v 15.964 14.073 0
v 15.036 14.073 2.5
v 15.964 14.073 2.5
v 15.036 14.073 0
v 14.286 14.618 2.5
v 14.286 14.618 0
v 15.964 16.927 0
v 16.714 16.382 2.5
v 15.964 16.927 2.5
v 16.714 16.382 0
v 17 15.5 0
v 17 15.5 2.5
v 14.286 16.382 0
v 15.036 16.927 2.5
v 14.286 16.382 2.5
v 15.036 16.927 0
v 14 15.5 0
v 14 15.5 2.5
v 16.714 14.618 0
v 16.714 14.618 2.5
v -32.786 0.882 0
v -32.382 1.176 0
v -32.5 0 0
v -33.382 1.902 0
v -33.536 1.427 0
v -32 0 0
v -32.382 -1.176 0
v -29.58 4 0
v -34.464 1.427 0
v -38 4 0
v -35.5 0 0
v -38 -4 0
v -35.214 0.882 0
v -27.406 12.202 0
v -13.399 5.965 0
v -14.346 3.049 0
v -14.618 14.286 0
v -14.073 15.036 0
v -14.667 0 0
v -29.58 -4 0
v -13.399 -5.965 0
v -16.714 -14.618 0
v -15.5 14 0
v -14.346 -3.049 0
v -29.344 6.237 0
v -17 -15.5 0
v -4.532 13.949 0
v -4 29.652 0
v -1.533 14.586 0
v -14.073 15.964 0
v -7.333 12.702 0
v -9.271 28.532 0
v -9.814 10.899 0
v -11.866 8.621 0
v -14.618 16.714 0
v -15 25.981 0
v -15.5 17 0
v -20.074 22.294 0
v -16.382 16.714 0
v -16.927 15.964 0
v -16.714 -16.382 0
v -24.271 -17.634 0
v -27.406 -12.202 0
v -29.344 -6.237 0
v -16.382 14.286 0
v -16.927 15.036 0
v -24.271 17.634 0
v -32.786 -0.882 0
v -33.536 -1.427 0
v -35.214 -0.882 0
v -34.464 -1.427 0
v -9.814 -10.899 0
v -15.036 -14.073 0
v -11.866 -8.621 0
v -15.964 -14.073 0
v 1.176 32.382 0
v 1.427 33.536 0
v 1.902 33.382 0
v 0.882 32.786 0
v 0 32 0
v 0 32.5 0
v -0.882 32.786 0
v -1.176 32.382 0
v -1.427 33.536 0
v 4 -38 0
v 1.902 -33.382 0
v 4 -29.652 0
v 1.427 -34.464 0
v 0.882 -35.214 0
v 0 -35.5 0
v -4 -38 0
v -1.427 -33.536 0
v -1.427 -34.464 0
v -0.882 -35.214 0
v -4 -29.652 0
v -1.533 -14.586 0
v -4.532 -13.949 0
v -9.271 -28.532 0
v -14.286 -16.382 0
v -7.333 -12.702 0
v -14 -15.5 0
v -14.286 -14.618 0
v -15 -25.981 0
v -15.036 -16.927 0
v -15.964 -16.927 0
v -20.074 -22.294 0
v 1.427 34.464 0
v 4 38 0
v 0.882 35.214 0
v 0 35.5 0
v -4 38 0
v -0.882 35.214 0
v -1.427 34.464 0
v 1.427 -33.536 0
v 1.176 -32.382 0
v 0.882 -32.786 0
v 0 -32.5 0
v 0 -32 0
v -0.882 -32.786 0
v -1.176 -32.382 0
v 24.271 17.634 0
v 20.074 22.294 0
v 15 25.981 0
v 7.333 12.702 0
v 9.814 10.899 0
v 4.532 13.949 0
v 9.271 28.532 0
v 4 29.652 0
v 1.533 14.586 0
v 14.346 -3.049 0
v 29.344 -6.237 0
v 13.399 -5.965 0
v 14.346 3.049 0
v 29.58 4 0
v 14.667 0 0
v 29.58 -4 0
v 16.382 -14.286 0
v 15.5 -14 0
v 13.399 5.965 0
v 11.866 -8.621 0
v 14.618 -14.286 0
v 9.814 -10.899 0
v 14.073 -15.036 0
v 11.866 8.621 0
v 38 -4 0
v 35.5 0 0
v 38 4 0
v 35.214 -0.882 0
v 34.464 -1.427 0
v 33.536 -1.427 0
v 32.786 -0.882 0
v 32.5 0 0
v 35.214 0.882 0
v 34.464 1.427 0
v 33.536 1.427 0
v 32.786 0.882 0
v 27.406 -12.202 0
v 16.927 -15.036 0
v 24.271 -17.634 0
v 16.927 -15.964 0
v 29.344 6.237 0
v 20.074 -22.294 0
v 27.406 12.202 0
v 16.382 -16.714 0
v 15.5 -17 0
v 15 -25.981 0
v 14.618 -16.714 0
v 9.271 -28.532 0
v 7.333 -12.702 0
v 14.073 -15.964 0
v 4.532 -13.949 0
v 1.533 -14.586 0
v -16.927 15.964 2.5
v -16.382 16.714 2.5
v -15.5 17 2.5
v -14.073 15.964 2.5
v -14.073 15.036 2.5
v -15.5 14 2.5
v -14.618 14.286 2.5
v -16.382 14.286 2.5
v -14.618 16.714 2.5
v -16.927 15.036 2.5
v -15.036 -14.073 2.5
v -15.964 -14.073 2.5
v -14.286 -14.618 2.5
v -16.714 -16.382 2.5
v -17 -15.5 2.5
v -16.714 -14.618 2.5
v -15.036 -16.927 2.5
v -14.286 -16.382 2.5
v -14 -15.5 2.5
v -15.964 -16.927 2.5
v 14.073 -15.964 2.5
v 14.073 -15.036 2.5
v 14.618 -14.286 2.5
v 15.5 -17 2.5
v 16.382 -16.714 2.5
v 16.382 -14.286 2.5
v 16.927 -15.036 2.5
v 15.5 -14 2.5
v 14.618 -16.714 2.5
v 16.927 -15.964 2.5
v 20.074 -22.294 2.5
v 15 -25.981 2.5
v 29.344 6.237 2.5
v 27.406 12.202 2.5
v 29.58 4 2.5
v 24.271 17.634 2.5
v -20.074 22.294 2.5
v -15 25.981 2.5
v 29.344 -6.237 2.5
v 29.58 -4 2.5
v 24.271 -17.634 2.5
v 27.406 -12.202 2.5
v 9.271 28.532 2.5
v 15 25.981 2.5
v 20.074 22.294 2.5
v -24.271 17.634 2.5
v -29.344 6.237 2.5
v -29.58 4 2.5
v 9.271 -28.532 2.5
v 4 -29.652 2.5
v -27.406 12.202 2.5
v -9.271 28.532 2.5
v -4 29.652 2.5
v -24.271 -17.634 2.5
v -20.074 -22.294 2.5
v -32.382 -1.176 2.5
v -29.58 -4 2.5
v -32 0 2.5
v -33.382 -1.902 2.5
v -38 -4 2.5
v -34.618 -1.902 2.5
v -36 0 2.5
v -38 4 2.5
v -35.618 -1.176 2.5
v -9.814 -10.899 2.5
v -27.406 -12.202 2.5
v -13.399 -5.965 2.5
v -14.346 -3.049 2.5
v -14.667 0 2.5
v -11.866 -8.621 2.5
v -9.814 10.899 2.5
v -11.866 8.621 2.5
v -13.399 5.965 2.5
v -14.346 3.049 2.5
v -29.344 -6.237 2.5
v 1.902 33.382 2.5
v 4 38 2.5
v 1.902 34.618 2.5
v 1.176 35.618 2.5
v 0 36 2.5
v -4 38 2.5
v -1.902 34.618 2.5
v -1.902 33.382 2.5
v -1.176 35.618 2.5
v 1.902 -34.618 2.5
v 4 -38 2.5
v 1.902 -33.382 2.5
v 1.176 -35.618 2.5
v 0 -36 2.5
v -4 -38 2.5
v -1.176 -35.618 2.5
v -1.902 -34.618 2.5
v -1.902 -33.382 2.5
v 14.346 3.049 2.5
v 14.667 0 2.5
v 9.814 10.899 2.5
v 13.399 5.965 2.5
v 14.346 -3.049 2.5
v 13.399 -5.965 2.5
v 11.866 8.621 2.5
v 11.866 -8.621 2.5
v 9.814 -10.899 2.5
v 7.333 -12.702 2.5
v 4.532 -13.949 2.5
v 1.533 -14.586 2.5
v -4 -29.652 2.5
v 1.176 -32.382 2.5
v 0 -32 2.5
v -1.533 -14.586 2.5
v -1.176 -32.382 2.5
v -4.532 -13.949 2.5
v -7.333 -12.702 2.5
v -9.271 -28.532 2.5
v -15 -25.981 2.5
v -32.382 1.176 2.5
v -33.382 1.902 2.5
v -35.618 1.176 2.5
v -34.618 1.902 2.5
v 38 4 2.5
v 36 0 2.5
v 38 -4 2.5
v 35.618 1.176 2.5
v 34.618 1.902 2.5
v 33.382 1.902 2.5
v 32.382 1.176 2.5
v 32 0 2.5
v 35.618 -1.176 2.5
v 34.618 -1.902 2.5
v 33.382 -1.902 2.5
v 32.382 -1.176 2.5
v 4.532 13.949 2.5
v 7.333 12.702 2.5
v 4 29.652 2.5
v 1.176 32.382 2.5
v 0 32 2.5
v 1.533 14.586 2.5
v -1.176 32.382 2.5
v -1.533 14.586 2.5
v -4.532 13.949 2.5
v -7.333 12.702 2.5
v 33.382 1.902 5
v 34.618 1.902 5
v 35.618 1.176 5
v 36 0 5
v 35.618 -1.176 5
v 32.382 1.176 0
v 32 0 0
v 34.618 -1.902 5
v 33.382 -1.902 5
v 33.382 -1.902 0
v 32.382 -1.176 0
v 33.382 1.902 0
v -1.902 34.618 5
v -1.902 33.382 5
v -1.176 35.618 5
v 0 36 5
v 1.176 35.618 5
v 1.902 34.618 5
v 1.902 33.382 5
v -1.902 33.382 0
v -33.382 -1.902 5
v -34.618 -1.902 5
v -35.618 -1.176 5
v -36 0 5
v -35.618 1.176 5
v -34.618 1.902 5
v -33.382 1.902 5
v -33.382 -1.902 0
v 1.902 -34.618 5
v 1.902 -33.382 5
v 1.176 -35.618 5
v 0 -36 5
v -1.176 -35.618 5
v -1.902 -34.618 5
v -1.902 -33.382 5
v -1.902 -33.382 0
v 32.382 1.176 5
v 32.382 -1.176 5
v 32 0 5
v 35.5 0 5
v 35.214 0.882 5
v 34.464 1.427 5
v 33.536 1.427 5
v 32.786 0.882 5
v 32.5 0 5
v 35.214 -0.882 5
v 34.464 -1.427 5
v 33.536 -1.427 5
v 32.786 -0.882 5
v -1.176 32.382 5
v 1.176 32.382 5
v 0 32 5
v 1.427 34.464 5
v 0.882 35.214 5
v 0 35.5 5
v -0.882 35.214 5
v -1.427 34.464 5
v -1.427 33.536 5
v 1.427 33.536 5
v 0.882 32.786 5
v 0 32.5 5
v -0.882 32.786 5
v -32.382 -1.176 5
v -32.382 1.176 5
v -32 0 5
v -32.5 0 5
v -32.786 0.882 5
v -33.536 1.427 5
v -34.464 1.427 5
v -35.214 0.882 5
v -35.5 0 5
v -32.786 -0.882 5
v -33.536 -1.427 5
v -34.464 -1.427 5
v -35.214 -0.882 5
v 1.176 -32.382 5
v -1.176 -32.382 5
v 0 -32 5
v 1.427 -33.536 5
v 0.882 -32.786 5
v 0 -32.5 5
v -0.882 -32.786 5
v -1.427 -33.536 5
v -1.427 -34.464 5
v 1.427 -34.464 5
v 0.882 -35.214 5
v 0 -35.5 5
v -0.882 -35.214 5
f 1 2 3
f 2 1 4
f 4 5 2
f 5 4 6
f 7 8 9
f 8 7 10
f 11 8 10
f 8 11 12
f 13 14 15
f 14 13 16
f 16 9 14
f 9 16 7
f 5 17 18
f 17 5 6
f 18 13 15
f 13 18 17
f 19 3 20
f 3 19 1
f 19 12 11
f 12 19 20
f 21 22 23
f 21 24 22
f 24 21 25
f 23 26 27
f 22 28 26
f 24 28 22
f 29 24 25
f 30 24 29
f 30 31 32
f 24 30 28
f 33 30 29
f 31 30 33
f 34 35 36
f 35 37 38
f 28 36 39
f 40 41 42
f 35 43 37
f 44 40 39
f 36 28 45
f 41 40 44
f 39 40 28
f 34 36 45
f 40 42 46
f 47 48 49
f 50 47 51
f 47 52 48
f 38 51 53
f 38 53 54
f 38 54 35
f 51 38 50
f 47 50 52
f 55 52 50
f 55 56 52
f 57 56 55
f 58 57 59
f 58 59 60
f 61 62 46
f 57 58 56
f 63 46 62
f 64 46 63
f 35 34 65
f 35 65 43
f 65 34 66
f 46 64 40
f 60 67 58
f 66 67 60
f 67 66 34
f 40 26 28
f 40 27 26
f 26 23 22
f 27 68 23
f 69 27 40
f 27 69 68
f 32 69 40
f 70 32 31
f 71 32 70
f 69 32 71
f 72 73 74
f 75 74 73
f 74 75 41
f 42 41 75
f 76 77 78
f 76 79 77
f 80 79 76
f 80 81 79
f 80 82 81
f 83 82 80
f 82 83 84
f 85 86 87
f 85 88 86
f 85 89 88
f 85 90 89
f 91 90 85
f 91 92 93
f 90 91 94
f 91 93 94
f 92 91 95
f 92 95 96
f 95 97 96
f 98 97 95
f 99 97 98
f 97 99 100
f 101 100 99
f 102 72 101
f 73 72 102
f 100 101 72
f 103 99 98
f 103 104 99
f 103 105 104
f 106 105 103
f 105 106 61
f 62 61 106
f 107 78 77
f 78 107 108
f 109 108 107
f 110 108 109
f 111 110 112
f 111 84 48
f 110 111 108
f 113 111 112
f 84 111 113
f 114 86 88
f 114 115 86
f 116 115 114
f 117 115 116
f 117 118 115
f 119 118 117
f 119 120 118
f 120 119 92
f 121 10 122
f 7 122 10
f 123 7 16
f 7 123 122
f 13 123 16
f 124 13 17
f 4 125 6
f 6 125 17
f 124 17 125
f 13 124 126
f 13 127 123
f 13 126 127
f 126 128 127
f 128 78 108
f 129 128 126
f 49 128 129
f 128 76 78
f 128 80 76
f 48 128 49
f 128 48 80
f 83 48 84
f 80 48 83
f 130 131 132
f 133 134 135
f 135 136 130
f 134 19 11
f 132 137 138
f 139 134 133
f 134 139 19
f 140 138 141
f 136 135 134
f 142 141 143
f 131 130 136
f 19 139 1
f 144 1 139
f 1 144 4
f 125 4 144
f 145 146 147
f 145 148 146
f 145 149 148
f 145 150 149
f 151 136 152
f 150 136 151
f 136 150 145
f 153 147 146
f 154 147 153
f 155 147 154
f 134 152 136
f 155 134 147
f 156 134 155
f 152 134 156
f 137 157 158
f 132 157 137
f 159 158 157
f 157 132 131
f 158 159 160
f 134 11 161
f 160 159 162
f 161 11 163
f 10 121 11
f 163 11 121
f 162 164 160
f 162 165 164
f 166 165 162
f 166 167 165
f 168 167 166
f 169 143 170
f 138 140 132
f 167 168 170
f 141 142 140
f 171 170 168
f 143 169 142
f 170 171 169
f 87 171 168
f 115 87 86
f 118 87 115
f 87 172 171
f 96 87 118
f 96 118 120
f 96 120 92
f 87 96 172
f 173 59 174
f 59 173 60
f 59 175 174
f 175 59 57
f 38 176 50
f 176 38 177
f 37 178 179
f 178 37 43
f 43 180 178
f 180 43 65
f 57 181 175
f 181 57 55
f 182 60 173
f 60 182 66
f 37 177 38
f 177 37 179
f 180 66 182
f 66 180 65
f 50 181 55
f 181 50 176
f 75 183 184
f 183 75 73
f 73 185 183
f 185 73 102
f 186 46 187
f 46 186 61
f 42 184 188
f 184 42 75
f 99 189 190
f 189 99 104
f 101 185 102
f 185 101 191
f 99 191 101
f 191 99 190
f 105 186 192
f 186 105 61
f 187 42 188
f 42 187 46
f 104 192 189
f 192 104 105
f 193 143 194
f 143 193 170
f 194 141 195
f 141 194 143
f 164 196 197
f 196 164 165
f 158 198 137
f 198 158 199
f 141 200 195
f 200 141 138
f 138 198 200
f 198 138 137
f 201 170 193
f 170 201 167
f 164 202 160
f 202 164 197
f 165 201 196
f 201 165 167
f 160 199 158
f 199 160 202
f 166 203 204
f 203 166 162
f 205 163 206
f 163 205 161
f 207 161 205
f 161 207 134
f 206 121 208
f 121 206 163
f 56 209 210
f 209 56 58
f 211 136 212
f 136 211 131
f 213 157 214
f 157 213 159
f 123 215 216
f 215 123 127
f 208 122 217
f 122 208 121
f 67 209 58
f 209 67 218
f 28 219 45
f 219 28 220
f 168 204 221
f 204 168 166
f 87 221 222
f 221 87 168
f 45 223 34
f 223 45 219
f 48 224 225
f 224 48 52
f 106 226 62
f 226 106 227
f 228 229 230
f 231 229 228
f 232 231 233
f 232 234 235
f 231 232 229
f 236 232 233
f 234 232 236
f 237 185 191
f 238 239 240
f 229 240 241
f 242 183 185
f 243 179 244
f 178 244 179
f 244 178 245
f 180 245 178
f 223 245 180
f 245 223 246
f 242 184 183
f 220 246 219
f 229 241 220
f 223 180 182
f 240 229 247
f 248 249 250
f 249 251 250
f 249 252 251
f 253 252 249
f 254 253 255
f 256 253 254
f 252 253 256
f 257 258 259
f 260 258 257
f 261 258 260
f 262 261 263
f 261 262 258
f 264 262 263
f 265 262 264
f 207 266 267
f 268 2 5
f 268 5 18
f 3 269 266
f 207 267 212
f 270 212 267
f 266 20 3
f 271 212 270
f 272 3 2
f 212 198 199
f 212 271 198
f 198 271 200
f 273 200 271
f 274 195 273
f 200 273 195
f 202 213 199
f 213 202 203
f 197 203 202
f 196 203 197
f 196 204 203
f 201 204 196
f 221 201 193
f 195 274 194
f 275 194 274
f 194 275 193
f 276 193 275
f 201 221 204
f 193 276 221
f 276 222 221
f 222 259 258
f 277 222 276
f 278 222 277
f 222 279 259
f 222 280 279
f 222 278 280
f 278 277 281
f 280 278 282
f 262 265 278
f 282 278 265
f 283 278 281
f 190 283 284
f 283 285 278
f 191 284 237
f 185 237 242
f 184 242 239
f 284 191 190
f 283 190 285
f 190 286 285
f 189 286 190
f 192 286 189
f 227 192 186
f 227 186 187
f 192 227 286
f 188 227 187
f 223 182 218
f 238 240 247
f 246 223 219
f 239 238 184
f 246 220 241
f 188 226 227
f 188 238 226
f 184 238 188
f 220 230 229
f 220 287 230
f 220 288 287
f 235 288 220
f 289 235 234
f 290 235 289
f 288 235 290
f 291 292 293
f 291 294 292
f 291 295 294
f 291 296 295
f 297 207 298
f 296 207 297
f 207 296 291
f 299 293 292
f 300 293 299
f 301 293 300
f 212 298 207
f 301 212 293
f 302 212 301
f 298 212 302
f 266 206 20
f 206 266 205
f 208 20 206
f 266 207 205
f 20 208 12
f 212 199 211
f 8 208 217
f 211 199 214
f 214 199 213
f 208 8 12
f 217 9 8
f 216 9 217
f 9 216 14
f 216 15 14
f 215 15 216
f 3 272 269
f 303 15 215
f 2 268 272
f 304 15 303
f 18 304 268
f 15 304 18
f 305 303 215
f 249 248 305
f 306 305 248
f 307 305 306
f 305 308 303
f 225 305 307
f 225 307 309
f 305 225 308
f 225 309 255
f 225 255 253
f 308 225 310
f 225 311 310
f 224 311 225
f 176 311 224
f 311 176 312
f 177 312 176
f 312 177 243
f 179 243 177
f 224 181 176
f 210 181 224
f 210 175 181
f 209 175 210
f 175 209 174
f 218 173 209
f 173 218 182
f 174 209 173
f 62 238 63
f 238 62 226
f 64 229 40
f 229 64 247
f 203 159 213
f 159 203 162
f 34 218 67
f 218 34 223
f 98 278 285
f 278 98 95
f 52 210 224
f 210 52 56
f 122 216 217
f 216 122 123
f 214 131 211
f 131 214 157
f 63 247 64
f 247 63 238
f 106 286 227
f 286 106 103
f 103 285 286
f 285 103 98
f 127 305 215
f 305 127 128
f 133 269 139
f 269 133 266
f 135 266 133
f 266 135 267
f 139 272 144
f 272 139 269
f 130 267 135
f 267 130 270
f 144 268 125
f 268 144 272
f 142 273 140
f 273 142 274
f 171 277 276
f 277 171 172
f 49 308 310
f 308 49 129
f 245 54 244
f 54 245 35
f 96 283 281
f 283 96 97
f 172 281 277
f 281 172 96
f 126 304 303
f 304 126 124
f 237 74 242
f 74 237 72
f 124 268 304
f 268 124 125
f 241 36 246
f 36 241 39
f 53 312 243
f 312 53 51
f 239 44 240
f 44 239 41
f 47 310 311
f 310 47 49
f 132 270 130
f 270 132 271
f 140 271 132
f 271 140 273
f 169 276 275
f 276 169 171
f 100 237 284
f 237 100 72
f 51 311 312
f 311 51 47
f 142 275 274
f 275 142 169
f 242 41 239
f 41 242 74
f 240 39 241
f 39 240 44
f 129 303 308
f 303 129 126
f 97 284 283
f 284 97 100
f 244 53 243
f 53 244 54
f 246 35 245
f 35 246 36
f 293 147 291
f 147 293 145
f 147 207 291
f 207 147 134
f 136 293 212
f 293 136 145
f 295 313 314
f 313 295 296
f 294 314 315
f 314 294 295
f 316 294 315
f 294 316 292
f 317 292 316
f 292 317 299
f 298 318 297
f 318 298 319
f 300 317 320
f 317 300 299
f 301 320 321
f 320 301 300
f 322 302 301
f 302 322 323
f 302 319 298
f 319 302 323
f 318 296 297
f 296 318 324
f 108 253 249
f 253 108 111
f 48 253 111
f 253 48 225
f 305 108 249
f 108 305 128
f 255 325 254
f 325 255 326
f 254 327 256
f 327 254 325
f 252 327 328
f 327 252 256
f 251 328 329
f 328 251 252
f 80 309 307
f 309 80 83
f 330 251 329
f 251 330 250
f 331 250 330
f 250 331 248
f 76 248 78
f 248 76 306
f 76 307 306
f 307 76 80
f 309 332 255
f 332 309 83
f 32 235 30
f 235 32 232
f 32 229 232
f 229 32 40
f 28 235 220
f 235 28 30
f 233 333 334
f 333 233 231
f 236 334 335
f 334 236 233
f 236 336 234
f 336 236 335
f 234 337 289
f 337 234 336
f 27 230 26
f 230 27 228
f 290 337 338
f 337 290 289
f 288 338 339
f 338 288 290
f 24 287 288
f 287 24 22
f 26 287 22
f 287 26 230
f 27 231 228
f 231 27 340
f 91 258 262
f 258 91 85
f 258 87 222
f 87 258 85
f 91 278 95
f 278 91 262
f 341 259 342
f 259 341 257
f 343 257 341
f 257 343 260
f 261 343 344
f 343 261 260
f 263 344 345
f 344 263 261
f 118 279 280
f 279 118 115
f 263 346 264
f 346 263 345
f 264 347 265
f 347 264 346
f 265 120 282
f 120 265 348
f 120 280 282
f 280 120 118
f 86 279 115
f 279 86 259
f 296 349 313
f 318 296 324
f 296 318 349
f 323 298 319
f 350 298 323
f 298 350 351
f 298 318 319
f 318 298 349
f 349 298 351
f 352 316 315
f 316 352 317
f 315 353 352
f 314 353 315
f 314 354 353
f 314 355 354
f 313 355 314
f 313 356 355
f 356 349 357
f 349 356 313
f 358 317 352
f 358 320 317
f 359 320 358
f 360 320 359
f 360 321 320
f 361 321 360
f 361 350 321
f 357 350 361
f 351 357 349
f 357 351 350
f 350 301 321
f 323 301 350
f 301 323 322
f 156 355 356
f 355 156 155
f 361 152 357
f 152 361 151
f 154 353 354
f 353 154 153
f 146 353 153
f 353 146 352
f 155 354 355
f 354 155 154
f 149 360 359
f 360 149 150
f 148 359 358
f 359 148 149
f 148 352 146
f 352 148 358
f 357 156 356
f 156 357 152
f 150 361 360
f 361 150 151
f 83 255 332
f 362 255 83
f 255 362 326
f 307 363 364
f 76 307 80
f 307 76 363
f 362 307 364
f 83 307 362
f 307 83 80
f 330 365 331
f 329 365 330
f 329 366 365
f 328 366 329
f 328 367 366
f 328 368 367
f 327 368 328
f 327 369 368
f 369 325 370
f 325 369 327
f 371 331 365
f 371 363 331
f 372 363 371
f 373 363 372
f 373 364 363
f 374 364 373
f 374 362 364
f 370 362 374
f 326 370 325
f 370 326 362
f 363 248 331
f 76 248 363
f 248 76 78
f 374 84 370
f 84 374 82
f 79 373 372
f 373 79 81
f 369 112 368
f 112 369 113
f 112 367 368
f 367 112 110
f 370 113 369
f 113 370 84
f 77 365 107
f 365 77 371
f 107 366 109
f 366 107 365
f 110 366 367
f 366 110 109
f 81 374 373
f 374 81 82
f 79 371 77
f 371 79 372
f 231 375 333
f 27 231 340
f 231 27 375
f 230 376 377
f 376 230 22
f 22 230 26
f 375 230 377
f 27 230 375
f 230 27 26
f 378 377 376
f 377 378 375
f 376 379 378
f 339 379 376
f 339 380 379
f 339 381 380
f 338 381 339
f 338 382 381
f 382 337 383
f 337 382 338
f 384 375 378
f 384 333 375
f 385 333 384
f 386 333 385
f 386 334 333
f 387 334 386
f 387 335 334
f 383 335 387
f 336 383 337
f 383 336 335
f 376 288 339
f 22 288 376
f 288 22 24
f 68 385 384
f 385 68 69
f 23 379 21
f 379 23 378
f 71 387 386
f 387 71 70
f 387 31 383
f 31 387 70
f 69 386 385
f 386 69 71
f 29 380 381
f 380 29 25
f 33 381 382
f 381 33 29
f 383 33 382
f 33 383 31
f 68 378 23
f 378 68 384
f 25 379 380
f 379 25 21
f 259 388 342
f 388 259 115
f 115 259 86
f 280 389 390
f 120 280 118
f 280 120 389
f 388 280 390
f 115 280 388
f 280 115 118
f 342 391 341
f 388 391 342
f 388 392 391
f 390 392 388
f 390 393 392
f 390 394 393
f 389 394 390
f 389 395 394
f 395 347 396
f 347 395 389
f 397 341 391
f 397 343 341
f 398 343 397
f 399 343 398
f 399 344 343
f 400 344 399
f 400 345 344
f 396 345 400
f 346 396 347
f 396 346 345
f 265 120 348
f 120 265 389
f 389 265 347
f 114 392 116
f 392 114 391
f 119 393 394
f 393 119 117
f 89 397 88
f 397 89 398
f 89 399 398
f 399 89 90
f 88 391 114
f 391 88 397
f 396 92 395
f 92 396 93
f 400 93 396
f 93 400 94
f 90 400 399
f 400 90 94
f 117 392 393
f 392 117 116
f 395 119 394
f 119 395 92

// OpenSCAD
// Diameter of the pump. Minimum of 60mm.
diam = 60;
// The spacing between the mounting holes on the stepper motor. Measure from the center of the holes.
bolt_spacing = 31;
// The space between the mounting plate and the pump gears.
mount_spacing = 2.5;
// How thick the mounting plate should be.
plate_thickness = 2.5;
// Mount inner diameter. The hole that will be in the center of the mounting plate.
mount_id = 22;
// The size of the mounting holes. Standard Nema 17 is an M3 (3mm).
thread_size = 3;

// -------------------- Connector settings ---------------------------------
// The thread size for the connector bolts you want, in mm (i.e. M3 is 3.0)
connect_bolt_size = 3.0;

// The lenght of the connector bolts, in mm (i.e M3x10 is 10.0)
connect_bolt_height = 10.0;

// Number of connectors you want.
num_connectors = 4;



// Calculated variables
connector_od = connect_bolt_size + 1;


// ============================ Main ====================================
mounting_plate();



// ++++++++++++++++++++++++++++ Modules +++++++++++++++++++++++++++++++++
// Mounting plate to attach to motor. Includes the spacer between the pump and mount.
module mounting_plate(){
	union(){
		difference(){
			cylinder(h=plate_thickness, r=diam/2);
			cylinder(h=plate_thickness + 1, r=(mount_id/3)*2);
			for(hole_num = [0 : 1 : 4]){
				rotate([0, 0, (hole_num * 90)]){
					translate([bolt_spacing/2, bolt_spacing/2, 0]){
						cylinder(h=plate_thickness+1, d=thread_size, $fn=10);
					}
				}
			}
		}
		connectors_arms();
		all_connectors(true);
	}
}

// Connector arms to attach to the plate or pump.
module connectors_arms(){
	increment = 360 / num_connectors;
	for(count = [0 : num_connectors]){
		rotate([0,  0, count*increment]){
			difference(){
				translate([((diam / 2) + (connector_od/2)),  0,  (plate_thickness/2)]){
					cube([connector_od*3, connector_od*2, plate_thickness], center=true);
				}
				translate([(diam/2) + connector_od,  0,  0]){
					cylinder(h=plate_thickness, d=connector_od, $fn=10);
				}
			}
		}
	}
}

// All x number of connectors.
module all_connectors(is_plate=false){
	increment = 360 / num_connectors;
	for(count = [0 : num_connectors]){
		rotate([0,  0, count*increment]){
			translate([(diam/2) + connector_od,  0,  0]){
				connector(is_plate);
			}
		}
	}
}

// An individual connector cylinder.
module connector(is_plate=false){
	if (is_plate) {
		difference(){
			cylinder(h=plate_thickness + mount_spacing, d=connector_od, $fn=10);
			cylinder(h=plate_thickness + mount_spacing, d=connect_bolt_size, $fn=10);
		}
	} else {
		echo("else")
		difference(){
			cylinder(h=connect_bolt_height - 2, d=connector_od, $fn=10);
			cylinder(h=connect_bolt_height - 2, d=connect_bolt_size, $fn=10);
		}
	}
}
